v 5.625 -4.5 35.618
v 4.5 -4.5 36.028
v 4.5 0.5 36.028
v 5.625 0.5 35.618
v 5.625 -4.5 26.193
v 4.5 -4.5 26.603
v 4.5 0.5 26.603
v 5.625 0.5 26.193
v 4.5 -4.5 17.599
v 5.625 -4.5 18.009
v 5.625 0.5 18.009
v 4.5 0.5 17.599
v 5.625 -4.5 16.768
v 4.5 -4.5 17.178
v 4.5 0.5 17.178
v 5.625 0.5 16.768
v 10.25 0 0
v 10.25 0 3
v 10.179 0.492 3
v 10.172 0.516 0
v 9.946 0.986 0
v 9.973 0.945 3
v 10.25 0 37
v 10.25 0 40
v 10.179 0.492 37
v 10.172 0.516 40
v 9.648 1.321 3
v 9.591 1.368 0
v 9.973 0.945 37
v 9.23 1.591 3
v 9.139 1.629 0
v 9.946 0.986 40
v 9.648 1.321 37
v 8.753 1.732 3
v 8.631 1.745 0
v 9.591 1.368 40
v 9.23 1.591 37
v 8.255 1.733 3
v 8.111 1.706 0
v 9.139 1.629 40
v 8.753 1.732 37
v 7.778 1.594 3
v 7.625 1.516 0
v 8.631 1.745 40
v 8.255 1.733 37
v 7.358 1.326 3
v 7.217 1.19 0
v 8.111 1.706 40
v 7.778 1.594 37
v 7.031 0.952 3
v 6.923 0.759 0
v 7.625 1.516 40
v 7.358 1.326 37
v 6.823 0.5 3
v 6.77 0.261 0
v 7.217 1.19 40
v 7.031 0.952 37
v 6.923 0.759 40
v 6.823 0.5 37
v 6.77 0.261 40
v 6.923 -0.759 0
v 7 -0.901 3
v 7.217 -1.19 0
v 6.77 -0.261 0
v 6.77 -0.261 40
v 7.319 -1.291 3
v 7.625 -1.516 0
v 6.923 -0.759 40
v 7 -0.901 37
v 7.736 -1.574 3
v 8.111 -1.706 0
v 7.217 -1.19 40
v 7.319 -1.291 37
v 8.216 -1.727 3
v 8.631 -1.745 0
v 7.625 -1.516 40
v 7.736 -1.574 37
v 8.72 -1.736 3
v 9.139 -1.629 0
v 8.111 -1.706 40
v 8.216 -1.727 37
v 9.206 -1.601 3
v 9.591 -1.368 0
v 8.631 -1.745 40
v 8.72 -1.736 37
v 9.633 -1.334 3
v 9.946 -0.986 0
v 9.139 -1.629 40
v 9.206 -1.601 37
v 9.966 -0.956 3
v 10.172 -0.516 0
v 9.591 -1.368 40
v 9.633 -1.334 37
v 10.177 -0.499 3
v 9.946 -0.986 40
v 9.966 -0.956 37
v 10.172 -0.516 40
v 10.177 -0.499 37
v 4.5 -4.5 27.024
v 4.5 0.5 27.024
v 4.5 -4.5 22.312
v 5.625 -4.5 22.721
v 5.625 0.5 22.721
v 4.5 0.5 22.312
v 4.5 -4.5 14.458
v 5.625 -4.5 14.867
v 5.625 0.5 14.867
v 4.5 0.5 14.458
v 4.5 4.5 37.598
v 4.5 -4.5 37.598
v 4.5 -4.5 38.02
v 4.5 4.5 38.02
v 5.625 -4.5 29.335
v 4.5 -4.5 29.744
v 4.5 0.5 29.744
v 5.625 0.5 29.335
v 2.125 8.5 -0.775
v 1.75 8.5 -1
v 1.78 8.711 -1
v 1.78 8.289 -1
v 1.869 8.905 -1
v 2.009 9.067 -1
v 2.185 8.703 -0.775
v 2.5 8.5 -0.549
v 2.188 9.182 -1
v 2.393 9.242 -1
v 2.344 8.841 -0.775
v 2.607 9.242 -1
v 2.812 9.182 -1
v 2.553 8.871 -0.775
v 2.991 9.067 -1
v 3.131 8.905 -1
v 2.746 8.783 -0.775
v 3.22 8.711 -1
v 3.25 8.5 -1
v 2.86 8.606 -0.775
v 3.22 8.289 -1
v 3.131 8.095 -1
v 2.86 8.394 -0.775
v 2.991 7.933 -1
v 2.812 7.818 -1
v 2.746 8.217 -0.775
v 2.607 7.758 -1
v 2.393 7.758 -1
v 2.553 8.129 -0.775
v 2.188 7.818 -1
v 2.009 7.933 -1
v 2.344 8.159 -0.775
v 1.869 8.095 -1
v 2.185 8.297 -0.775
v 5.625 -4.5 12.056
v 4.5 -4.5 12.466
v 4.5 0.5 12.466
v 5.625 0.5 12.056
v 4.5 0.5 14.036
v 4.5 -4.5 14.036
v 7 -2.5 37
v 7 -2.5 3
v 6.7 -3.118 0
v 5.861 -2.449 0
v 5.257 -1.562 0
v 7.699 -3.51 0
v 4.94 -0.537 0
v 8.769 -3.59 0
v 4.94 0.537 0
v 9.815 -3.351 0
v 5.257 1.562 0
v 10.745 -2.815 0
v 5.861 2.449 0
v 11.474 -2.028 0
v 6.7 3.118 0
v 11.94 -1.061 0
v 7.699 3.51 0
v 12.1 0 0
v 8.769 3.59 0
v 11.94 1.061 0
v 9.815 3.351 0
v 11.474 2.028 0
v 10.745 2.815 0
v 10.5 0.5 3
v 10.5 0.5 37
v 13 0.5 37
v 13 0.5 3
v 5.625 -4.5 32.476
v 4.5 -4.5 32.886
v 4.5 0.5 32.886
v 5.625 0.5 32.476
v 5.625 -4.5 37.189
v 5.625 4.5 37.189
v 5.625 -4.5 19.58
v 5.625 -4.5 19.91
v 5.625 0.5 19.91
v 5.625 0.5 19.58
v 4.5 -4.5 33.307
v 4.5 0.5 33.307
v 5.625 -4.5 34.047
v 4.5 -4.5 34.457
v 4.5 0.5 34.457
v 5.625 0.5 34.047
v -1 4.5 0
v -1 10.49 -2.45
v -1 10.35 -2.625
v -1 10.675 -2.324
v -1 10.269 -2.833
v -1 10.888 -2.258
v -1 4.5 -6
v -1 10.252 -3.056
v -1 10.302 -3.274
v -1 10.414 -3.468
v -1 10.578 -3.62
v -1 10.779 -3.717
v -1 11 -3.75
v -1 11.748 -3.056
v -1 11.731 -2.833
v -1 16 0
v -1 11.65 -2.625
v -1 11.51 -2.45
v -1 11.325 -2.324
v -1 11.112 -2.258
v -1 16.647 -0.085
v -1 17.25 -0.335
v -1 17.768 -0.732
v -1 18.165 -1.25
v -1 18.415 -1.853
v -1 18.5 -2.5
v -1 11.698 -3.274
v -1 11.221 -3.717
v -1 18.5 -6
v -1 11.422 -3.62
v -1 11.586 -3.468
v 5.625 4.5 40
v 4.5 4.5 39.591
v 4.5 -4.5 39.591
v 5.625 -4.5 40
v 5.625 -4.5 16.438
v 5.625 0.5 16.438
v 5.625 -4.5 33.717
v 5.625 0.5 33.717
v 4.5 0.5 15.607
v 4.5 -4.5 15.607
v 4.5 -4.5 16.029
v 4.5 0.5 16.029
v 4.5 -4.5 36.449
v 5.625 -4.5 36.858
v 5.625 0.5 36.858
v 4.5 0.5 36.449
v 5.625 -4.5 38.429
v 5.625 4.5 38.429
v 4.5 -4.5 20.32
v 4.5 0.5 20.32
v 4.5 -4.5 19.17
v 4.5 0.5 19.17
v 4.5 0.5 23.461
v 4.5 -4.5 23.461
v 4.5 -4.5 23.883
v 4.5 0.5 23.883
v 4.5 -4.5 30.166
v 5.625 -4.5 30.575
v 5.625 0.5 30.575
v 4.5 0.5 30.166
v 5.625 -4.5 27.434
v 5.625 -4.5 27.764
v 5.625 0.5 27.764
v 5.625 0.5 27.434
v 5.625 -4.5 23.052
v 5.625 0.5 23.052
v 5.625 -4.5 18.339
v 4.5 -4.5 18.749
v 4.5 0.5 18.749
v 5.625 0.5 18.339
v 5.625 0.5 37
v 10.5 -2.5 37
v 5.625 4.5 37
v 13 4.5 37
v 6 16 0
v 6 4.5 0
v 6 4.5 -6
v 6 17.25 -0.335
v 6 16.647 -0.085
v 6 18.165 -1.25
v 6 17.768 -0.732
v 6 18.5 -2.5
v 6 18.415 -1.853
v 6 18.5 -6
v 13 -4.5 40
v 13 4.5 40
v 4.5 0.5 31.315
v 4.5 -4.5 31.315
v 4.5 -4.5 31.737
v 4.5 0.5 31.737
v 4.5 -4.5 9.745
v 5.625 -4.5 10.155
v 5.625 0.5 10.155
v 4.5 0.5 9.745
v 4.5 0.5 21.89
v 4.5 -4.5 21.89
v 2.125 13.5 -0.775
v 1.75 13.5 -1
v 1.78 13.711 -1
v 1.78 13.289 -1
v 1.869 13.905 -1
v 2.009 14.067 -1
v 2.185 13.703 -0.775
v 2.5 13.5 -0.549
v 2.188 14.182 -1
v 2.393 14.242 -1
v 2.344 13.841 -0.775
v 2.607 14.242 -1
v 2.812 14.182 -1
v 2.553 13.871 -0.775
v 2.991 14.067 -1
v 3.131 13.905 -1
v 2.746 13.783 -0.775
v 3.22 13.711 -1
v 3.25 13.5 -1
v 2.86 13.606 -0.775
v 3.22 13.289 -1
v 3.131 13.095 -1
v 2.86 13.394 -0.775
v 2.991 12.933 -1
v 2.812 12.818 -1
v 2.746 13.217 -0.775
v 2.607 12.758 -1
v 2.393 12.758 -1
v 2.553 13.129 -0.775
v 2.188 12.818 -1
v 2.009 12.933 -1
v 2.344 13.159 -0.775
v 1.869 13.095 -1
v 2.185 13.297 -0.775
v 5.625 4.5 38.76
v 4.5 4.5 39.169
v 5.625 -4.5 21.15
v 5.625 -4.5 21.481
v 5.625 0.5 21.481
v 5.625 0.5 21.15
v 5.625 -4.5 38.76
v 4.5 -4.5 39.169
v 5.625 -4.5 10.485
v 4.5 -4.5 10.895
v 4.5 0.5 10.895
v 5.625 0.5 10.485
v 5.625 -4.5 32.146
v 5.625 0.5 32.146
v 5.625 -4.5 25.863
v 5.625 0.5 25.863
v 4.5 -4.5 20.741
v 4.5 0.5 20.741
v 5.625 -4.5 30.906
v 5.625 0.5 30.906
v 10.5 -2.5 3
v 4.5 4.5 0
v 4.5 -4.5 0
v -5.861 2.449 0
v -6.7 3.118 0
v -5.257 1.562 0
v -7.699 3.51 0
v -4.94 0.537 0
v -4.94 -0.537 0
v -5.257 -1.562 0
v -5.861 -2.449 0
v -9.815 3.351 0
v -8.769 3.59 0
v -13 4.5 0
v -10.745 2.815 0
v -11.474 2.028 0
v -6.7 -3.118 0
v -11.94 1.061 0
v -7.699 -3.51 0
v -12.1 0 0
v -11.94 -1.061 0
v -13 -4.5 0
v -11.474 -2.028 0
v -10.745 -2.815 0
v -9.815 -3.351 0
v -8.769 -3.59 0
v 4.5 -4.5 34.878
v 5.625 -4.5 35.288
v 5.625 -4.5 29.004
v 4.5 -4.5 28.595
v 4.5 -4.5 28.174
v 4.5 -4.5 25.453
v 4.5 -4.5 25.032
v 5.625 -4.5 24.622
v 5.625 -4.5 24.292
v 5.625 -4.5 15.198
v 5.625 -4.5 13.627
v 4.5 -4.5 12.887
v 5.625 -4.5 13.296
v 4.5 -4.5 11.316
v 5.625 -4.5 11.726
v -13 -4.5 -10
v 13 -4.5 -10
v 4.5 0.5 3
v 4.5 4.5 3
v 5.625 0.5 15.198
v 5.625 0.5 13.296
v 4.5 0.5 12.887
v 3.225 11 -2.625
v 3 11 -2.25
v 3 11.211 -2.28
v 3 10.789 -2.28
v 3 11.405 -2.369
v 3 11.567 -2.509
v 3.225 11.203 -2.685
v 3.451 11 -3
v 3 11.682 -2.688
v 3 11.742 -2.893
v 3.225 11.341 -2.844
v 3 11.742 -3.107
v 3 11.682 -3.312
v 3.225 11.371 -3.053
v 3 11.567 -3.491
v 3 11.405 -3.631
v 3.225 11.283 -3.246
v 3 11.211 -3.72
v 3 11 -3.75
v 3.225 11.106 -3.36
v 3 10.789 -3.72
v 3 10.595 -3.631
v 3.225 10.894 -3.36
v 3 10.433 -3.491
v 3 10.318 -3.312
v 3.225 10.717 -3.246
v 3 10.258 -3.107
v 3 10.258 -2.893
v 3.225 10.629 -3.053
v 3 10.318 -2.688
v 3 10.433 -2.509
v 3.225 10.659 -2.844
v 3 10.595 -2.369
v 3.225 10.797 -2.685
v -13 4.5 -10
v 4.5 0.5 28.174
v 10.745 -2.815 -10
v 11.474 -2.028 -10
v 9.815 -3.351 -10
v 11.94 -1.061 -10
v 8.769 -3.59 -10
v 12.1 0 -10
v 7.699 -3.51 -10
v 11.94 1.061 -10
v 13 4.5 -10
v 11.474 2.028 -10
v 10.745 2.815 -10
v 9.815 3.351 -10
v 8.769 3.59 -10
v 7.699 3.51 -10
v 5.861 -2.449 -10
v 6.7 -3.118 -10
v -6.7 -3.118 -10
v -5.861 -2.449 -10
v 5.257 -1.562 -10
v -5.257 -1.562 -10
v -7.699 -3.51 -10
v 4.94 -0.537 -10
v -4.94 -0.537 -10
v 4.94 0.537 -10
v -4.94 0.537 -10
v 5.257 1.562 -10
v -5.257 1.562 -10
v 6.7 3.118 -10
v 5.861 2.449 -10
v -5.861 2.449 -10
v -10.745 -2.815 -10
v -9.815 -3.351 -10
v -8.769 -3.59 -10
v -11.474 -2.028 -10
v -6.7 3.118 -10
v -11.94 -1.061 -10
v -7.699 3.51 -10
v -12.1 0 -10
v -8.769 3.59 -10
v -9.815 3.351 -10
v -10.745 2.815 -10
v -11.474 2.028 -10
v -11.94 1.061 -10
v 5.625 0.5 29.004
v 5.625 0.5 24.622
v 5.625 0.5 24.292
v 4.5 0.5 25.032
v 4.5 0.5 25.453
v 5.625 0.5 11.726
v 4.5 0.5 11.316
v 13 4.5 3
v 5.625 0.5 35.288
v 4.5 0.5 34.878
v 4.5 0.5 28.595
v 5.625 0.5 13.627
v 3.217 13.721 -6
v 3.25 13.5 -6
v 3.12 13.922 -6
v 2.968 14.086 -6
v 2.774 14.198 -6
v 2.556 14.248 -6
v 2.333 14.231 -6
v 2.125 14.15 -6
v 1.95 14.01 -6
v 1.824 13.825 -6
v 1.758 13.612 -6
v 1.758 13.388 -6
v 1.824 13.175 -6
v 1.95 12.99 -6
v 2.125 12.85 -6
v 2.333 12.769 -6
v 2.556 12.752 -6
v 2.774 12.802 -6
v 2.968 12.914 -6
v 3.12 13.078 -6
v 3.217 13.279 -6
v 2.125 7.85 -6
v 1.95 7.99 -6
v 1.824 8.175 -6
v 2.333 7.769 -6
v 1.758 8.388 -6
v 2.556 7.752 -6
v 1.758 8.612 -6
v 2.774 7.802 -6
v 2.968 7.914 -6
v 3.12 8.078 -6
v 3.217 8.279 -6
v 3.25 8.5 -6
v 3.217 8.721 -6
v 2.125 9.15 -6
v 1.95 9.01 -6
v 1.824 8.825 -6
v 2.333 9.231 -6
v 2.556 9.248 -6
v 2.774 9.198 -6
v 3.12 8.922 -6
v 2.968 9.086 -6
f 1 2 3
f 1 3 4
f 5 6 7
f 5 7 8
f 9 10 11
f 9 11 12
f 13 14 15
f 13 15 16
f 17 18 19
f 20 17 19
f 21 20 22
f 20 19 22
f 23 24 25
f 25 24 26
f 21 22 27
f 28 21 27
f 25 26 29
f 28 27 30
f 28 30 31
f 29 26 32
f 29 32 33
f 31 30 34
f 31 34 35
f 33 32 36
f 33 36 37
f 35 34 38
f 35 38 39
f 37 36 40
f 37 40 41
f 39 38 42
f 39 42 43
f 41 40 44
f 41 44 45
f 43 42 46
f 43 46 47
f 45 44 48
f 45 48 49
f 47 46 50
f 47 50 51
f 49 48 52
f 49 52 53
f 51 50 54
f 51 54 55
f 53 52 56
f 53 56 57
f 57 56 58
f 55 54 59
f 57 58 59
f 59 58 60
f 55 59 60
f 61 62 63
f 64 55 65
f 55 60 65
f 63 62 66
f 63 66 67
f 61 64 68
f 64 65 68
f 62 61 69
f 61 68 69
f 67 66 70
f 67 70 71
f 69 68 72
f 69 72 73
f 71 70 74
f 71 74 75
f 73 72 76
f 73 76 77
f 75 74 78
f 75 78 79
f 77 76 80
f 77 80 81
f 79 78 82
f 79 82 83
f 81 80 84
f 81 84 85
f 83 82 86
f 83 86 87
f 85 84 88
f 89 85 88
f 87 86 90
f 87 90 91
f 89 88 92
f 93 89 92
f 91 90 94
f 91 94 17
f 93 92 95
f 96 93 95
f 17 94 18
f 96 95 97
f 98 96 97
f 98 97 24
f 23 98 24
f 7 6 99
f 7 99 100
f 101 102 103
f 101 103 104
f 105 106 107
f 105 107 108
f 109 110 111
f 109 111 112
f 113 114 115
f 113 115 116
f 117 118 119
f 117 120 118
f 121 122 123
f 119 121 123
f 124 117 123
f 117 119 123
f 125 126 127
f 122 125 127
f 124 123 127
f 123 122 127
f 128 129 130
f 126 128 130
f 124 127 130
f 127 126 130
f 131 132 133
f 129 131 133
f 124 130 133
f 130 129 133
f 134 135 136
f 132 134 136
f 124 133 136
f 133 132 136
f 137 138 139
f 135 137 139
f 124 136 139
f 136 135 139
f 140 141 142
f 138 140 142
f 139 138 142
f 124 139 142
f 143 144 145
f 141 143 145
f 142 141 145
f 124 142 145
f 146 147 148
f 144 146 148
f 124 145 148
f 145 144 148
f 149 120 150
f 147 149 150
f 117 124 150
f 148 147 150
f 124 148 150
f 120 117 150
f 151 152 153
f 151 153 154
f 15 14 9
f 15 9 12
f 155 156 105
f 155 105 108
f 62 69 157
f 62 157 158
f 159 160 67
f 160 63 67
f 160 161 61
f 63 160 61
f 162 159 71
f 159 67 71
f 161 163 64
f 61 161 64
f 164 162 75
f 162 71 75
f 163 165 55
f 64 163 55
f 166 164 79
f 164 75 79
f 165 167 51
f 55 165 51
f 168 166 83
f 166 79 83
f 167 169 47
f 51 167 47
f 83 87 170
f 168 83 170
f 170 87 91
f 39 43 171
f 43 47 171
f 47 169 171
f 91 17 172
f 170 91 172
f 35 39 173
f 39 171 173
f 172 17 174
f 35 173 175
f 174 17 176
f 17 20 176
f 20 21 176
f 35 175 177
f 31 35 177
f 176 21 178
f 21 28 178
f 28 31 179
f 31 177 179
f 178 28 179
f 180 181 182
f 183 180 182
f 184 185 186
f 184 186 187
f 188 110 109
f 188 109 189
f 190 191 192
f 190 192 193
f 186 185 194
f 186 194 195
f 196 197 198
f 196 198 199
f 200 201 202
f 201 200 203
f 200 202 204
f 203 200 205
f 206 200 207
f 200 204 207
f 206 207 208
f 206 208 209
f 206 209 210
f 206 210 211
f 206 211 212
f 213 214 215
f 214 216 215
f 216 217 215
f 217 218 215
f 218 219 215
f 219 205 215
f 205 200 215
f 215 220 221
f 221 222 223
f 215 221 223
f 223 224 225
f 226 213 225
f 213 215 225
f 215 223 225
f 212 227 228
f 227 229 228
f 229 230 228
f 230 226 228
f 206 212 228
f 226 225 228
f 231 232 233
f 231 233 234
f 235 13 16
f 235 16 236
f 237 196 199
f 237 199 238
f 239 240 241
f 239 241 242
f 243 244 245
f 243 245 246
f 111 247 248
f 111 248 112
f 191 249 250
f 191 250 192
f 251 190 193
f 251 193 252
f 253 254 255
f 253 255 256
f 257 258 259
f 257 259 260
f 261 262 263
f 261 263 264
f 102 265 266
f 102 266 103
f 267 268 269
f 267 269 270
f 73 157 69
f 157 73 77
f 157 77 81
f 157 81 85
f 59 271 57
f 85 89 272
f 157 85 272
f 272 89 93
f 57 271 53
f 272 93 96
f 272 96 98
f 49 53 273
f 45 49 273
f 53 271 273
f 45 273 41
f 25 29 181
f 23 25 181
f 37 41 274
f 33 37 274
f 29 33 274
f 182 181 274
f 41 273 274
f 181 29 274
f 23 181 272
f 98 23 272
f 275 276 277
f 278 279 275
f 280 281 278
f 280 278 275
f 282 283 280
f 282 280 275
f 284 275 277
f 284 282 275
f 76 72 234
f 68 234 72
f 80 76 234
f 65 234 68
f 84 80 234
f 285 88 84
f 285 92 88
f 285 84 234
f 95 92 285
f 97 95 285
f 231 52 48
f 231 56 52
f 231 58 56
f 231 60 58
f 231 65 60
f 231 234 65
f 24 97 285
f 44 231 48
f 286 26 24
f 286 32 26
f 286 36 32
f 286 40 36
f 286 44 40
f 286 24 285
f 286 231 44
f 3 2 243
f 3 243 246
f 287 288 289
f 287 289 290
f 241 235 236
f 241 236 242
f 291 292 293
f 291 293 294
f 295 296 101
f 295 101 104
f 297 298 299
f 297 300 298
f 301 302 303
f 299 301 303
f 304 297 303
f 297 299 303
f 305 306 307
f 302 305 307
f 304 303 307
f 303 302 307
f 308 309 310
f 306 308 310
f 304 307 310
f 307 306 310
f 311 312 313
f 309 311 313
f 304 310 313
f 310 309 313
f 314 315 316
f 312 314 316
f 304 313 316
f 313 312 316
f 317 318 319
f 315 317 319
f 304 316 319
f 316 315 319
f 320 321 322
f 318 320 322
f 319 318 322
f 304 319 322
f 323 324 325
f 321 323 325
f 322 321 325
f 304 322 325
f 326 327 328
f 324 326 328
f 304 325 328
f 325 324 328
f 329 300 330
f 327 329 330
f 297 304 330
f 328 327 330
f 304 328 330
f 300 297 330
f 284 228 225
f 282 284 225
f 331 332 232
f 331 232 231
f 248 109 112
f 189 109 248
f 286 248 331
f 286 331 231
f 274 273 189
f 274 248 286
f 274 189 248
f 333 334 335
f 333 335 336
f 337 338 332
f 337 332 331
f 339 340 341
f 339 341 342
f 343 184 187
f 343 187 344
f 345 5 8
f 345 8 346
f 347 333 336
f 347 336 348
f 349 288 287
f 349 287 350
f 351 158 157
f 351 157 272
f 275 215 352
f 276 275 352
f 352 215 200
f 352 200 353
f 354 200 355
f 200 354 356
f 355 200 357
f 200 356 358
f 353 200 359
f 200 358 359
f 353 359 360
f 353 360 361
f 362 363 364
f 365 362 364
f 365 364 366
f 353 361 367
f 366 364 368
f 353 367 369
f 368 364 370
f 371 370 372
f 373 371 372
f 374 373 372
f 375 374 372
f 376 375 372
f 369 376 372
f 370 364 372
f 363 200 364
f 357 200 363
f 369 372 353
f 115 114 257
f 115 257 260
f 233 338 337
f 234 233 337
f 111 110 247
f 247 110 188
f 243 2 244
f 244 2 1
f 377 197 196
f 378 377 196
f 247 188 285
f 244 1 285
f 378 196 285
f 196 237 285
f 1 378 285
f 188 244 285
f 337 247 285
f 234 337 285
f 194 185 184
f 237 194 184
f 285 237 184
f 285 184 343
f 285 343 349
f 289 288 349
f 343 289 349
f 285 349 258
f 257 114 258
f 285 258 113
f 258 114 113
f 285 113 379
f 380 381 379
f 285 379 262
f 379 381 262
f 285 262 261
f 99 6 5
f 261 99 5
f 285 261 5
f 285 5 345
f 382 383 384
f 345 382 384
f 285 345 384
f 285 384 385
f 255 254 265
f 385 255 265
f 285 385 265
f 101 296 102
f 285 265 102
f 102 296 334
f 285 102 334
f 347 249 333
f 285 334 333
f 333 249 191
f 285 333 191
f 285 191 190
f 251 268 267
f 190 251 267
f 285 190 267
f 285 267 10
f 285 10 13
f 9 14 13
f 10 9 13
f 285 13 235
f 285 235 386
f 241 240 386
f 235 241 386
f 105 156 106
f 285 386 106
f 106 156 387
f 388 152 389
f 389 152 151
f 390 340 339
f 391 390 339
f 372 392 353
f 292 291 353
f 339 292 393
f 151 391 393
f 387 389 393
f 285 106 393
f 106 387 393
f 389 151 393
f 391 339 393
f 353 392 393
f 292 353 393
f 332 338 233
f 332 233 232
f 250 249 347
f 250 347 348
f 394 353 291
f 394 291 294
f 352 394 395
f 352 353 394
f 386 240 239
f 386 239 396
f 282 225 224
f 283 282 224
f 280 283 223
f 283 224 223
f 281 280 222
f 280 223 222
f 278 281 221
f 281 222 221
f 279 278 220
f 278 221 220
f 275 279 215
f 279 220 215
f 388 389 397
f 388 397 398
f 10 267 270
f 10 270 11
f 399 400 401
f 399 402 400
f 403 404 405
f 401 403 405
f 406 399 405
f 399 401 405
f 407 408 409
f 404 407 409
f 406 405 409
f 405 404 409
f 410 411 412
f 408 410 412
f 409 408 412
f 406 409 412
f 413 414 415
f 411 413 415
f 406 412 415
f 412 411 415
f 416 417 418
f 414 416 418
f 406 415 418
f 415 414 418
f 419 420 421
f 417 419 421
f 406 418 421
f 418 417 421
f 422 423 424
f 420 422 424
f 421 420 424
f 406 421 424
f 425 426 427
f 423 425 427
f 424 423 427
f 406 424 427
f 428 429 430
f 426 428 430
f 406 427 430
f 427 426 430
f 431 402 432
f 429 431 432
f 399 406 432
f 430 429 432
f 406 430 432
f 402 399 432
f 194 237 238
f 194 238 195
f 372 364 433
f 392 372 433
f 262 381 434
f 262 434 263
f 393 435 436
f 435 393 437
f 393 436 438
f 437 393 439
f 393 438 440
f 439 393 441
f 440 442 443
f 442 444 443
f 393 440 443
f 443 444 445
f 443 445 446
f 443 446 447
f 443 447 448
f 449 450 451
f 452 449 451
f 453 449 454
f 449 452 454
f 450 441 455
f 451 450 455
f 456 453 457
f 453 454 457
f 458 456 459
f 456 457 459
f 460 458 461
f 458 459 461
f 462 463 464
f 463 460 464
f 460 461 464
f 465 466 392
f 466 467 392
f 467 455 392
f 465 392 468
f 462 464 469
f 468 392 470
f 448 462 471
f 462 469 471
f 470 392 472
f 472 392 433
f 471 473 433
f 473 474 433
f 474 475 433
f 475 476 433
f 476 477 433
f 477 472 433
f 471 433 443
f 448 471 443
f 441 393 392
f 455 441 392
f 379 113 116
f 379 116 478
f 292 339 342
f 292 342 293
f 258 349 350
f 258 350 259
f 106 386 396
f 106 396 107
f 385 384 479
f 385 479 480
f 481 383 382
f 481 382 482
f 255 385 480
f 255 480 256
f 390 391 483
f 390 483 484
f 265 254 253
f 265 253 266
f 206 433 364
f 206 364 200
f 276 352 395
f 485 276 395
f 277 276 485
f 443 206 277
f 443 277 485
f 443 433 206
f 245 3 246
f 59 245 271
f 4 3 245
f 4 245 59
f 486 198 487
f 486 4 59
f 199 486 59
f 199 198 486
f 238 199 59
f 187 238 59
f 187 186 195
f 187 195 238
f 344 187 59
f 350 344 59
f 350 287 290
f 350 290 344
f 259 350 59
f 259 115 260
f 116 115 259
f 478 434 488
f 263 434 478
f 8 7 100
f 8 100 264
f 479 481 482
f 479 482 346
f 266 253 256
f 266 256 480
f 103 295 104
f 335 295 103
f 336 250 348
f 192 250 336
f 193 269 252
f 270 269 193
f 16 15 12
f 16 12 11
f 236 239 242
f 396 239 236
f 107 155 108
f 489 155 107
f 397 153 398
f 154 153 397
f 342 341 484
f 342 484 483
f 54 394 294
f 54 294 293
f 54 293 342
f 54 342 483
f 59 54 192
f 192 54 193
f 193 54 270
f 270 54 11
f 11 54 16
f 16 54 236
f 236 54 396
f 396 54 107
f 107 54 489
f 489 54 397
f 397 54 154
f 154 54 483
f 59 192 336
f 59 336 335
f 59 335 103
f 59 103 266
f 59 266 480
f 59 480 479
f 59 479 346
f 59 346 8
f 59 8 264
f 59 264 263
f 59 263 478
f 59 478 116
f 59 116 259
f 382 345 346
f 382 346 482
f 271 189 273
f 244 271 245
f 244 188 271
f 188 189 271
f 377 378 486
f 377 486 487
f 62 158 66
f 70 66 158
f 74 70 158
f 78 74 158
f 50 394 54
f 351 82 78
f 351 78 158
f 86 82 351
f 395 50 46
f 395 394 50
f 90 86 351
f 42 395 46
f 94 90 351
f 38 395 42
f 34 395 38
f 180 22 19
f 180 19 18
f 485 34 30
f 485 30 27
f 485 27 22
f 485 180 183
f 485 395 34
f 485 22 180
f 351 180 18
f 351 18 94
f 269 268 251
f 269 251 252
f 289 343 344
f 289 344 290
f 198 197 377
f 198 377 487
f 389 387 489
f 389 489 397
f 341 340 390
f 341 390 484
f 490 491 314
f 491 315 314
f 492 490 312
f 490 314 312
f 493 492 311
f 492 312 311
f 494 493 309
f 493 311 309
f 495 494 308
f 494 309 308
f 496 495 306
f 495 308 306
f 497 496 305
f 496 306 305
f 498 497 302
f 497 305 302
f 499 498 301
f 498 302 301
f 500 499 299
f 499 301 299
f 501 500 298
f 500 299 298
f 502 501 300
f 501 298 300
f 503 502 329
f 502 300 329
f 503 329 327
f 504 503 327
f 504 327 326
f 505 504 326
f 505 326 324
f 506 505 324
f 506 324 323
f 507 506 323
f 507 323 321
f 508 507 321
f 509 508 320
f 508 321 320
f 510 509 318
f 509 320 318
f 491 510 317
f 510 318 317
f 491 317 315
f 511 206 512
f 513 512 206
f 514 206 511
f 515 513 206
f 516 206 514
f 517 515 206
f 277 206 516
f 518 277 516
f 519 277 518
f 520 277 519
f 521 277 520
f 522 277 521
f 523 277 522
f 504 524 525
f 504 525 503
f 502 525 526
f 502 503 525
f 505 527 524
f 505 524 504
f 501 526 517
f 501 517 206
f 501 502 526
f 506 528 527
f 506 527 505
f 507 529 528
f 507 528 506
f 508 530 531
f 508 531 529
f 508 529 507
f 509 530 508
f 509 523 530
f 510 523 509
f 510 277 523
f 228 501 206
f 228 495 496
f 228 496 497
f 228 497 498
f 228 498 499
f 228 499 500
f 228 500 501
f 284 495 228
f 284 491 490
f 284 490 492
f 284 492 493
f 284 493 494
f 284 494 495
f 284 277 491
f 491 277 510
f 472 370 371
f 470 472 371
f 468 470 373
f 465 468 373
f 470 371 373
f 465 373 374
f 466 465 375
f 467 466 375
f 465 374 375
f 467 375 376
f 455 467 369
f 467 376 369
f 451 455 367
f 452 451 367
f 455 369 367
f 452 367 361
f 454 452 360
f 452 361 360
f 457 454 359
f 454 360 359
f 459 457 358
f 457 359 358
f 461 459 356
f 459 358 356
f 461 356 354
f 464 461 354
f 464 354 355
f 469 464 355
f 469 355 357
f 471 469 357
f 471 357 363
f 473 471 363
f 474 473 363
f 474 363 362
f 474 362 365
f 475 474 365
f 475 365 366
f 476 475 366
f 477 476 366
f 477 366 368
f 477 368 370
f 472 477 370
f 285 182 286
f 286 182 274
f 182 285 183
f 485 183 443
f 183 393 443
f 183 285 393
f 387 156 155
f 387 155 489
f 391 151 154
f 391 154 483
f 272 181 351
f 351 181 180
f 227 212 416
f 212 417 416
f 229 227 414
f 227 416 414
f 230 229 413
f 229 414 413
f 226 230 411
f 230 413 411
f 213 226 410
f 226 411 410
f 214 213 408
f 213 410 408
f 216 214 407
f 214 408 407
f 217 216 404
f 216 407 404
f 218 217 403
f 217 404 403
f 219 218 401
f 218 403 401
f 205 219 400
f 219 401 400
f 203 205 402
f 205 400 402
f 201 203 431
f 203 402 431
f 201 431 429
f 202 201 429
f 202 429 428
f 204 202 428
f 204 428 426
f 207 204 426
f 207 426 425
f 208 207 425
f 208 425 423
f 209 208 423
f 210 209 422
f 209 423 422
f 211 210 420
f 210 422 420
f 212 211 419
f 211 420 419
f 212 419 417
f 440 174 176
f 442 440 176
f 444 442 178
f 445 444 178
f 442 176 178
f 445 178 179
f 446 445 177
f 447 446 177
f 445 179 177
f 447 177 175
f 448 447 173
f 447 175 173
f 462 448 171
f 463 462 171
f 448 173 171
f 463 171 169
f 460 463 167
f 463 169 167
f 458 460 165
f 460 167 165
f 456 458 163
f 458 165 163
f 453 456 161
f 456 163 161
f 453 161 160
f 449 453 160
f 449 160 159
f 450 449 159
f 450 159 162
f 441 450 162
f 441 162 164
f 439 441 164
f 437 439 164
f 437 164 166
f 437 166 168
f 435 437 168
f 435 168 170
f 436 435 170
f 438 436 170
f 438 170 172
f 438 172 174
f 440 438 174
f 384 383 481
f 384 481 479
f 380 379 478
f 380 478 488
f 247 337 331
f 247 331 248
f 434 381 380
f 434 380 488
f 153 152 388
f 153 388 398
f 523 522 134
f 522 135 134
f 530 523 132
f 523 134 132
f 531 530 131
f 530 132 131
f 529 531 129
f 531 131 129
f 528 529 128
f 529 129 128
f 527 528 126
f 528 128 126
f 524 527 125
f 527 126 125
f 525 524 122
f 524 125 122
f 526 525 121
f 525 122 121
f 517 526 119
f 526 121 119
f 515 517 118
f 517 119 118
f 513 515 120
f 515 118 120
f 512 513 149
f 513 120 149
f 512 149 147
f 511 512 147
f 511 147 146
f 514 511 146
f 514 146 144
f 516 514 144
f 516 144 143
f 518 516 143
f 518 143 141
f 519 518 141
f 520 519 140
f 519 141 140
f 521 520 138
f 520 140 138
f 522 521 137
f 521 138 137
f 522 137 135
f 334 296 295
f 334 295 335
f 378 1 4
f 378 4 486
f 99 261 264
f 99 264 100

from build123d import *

# Parameters (mm, degrees)
SKETCH_1_W                = 26
SKETCH_1_H                = 9
EXTRUDE_1_DEPTH           = 10
SKETCH_2_R                = 3.6
CUT_EXTRUDE_1_DEPTH       = 18.007351352
EXTRUDE_2_DEPTH           = 26
CUT_EXTRUDE_2_DEPTH       = 7
SKETCH_7_W                = 8.5
SKETCH_7_H                = 9
EXTRUDE_3_DEPTH           = 40
SKETCH_8_R                = 1.75
CUT_EXTRUDE_3_DEPTH       = 40
SKETCH_9_W                = 3.5
SKETCH_9_H                = 34
CUT_EXTRUDE_4_DEPTH       = 7
CUT_EXTRUDE_12_DEPTH      = 50.979995998
PATTERN_START             = -4.5
PATTERN_LINEAR_2_DEPTH    = 9
SKETCH_22_W               = 8.5
SKETCH_22_H               = 34
CUT_EXTRUDE_13_DEPTH      = 4
CUT_EXTRUDE_17_DEPTH      = 58.168610268
CUT_EXTRUDE_17_DEPTH_BACK = 58.168610268
SKETCH_27_W               = 4
SKETCH_27_H               = 28.3452151
CUT_EXTRUDE_18_DEPTH      = 52.168838173
CUT_EXTRUDE_18_DEPTH_BACK = 12
F_2_0MM_1_D               = 1.5
F_2_0MM_1_DEPTH           = 5
F_2_0MM_1_TIP             = 0.450645464
F_2_0MM_2_D               = 1.5
F_2_0MM_2_DEPTH           = 4
F_2_0MM_2_TIP             = 0.450645464


# Read off the part's stored shape, not the designer's step: 阵列(线性)2
with BuildPart() as part:
    # 草图1 → 凸台-拉伸1 (new body)
    with BuildSketch(Plane.XY):
        Rectangle(SKETCH_1_W, SKETCH_1_H)
    extrude(amount=-EXTRUDE_1_DEPTH)

    # 草图2 → 切除-拉伸1 (cut, through all)
    with BuildSketch(Plane.XY):
        with Locations((8.5, 0)):
            Circle(SKETCH_2_R)
        with Locations(Location((-8.5, 0, 0), (0, 0, 180))):
            Circle(SKETCH_2_R)
    extrude(amount=-CUT_EXTRUDE_1_DEPTH, mode=Mode.SUBTRACT)

    # 草图5 → 凸台-拉伸2 (add, through all)
    with BuildSketch(Plane.ZY.offset(13)):
        with BuildLine():
            Line((0, 4.5), (-10, 4.5))
            Line((-10, 4.5), (-10, 8.301419967))
            Line((-10, 8.301419967), (-10, 30.5))
            ThreePointArc((-10, 30.5), (-9.707106781, 31.207106781), (-9, 31.5))
            Line((-9, 31.5), (-8, 31.5))
            Line((-8, 31.5), (-8, 20.1))
            ThreePointArc((-8, 20.1), (-7.53137085, 18.96862915), (-6.4, 18.5))
            Line((-6.4, 18.5), (-2.5, 18.5))
            ThreePointArc((-2.5, 18.5), (-0.732233047, 17.767766953), (0, 16))
            Line((0, 16), (0, 4.5))
        make_face()
    extrude(amount=-EXTRUDE_2_DEPTH)

    # 草图5<2> → 切除-拉伸2 (cut)
    with BuildSketch(Plane.ZY.offset(13)):
        with BuildLine():
            Line((0, 4.5), (-10, 4.5))
            Line((-10, 4.5), (-10, 8.301419967))
            Line((-10, 8.301419967), (-10, 30.5))
            ThreePointArc((-10, 30.5), (-9.707106781, 31.207106781), (-9, 31.5))
            Line((-9, 31.5), (-8, 31.5))
            Line((-8, 31.5), (-8, 20.1))
            ThreePointArc((-8, 20.1), (-7.53137085, 18.96862915), (-6.4, 18.5))
            Line((-6.4, 18.5), (-2.5, 18.5))
            ThreePointArc((-2.5, 18.5), (-0.732233047, 17.767766953), (0, 16))
            Line((0, 16), (0, 4.5))
        make_face()
    cut_extrude_2 = extrude(amount=-CUT_EXTRUDE_2_DEPTH, mode=Mode.SUBTRACT)

    # 镜向1: 切除-拉伸2 across plane
    add(cut_extrude_2.mirror(Plane(origin=(0, 0, 0), x_dir=(0, 0, 1), z_dir=(1, 0, 0))), mode=Mode.SUBTRACT)

    # 草图7 → 凸台-拉伸3 (add)
    with BuildSketch(Plane.XY):
        with Locations((8.75, 0)):
            Rectangle(SKETCH_7_W, SKETCH_7_H)
    extrude(amount=EXTRUDE_3_DEPTH)

    # 草图8 → 切除-拉伸3 (cut)
    with BuildSketch(Plane.XY.offset(40)):
        with Locations((8.5, 0)):
            Circle(SKETCH_8_R)
    extrude(amount=-CUT_EXTRUDE_3_DEPTH, mode=Mode.SUBTRACT)

    # 草图9 → 切除-拉伸4 (cut)
    with BuildSketch(Plane(origin=(0, 4.5, 0), x_dir=(1, 0, 0), z_dir=(0, 1, 0))):
        with Locations((8.75, -20)):
            Rectangle(SKETCH_9_W, SKETCH_9_H)
    extrude(amount=-CUT_EXTRUDE_4_DEPTH, mode=Mode.SUBTRACT)

    # 草图10 → 切除-拉伸12 (cut, through all)
    with BuildSketch(Plane(origin=(0, 4.5, 0), x_dir=(1, 0, 0), z_dir=(0, 1, 0))):
        Polygon((5.625, -40), (5.625, -40.330435371), (4.5, -40.739901884), (4.5, -39.590533486), align=None)
    extrude(amount=-CUT_EXTRUDE_12_DEPTH, mode=Mode.SUBTRACT)

    # 阵列(线性)2 outline → 阵列(线性)2 (cut)
    with BuildSketch(Plane(origin=(0, 0, 0), x_dir=(1, 0, 0), z_dir=(0, 1, 0)).offset(PATTERN_START)):
        Polygon((5.625, -10.485305161), (5.625, -10.154869791), (4.5, -9.745403277), (4.5, -10.894771675), align=None)
        Polygon((5.625, -38.429203673), (4.5, -38.01973716), (4.5, -39.169105557), (5.625, -38.759639044), align=None)
        Polygon((5.625, -36.858407346), (4.5, -36.448940833), (4.5, -37.598309231), (5.625, -37.188842717), align=None)
        Polygon((5.625, -35.28761102), (4.5, -34.878144506), (4.5, -36.027512904), (5.625, -35.61804639), align=None)
        Polygon((5.625, -33.716814693), (4.5, -33.307348179), (4.5, -34.456716577), (5.625, -34.047250063), align=None)
        Polygon((5.625, -32.146018366), (4.5, -31.736551852), (4.5, -32.88592025), (5.625, -32.476453737), align=None)
        Polygon((5.625, -30.575222039), (4.5, -30.165755526), (4.5, -31.315123923), (5.625, -30.90565741), align=None)
        Polygon((5.625, -29.004425712), (4.5, -28.594959199), (4.5, -29.744327597), (5.625, -29.334861083), align=None)
        Polygon((5.625, -27.433629386), (4.5, -27.024162872), (4.5, -28.17353127), (5.625, -27.764064756), align=None)
        Polygon((5.625, -25.862833059), (4.5, -25.453366545), (4.5, -26.602734943), (5.625, -26.193268429), align=None)
        Polygon((5.625, -24.292036732), (4.5, -23.882570219), (4.5, -25.031938616), (5.625, -24.622472103), align=None)
        Polygon((5.625, -22.721240405), (4.5, -22.311773892), (4.5, -23.461142289), (5.625, -23.051675776), align=None)
        Polygon((5.625, -21.150444078), (4.5, -20.740977565), (4.5, -21.890345963), (5.625, -21.480879449), align=None)
        Polygon((5.625, -19.579647752), (4.5, -19.170181238), (4.5, -20.319549636), (5.625, -19.910083122), align=None)
        Polygon((5.625, -18.008851425), (4.5, -17.599384911), (4.5, -18.748753309), (5.625, -18.339286795), align=None)
        Polygon((5.625, -16.438055098), (4.5, -16.028588585), (4.5, -17.177956982), (5.625, -16.768490469), align=None)
        Polygon((5.625, -14.867258771), (4.5, -14.457792258), (4.5, -15.607160655), (5.625, -15.197694142), align=None)
        Polygon((5.625, -13.296462444), (4.5, -12.886995931), (4.5, -14.036364329), (5.625, -13.626897815), align=None)
        Polygon((5.625, -11.725666118), (4.5, -11.316199604), (4.5, -12.465568002), (5.625, -12.056101488), align=None)
    extrude(amount=PATTERN_LINEAR_2_DEPTH, mode=Mode.SUBTRACT)

    # 草图22 → 切除-拉伸13 (cut)
    with BuildSketch(Plane(origin=(0, 4.5, 0), x_dir=(1, 0, 0), z_dir=(0, 1, 0))):
        with Locations((8.75, -20)):
            Rectangle(SKETCH_22_W, SKETCH_22_H)
    extrude(amount=-CUT_EXTRUDE_13_DEPTH, mode=Mode.SUBTRACT)

    # 草图27 → 切除-拉伸17 (cut, two sides: drawn at the far end of the back side and taken through both)
    with BuildSketch(Plane.ZY.offset(13).offset(-CUT_EXTRUDE_17_DEPTH_BACK)):
        with Locations((-8, 18.67260755)):
            Rectangle(SKETCH_27_W, SKETCH_27_H)
    extrude(amount=CUT_EXTRUDE_17_DEPTH + CUT_EXTRUDE_17_DEPTH_BACK, mode=Mode.SUBTRACT)

    # 草图5<5> → 切除-拉伸18 (cut, two sides: drawn at the far end of the back side and taken through both)
    with BuildSketch(Plane.ZY.offset(13).offset(-CUT_EXTRUDE_18_DEPTH_BACK)):
        with BuildLine():
            Line((0, 4.5), (-10, 4.5))
            Line((-10, 4.5), (-10, 8.301419967))
            Line((-10, 8.301419967), (-10, 30.5))
            ThreePointArc((-10, 30.5), (-9.707106781, 31.207106781), (-9, 31.5))
            Line((-9, 31.5), (-8, 31.5))
            Line((-8, 31.5), (-8, 20.1))
            ThreePointArc((-8, 20.1), (-7.53137085, 18.96862915), (-6.4, 18.5))
            Line((-6.4, 18.5), (-2.5, 18.5))
            ThreePointArc((-2.5, 18.5), (-0.732233047, 17.767766953), (0, 16))
            Line((0, 16), (0, 4.5))
        make_face()
    extrude(amount=CUT_EXTRUDE_18_DEPTH + CUT_EXTRUDE_18_DEPTH_BACK, mode=Mode.SUBTRACT)

    # Ø2.0mm 暗销孔1
    with Locations(Plane(origin=(0, 0, -6), x_dir=(-1, 0, 0), z_dir=(0, 0, -1))):
        with Locations((-2.5, 13.5), (-2.5, 8.5)):
            Hole(F_2_0MM_1_D / 2, depth=F_2_0MM_1_DEPTH)
            with Locations((0, 0, -(F_2_0MM_1_DEPTH + F_2_0MM_1_TIP / 2))):  # 118° drill point
                Cone(0, F_2_0MM_1_D / 2, F_2_0MM_1_TIP, mode=Mode.SUBTRACT)

    # Ø2.0mm 暗销孔2
    with Locations(Plane.ZY.offset(1)):
        with Locations((-3, 11)):
            Hole(F_2_0MM_2_D / 2, depth=F_2_0MM_2_DEPTH)
            with Locations((0, 0, -(F_2_0MM_2_DEPTH + F_2_0MM_2_TIP / 2))):  # 118° drill point
                Cone(0, F_2_0MM_2_D / 2, F_2_0MM_2_TIP, mode=Mode.SUBTRACT)


solid = part.part
